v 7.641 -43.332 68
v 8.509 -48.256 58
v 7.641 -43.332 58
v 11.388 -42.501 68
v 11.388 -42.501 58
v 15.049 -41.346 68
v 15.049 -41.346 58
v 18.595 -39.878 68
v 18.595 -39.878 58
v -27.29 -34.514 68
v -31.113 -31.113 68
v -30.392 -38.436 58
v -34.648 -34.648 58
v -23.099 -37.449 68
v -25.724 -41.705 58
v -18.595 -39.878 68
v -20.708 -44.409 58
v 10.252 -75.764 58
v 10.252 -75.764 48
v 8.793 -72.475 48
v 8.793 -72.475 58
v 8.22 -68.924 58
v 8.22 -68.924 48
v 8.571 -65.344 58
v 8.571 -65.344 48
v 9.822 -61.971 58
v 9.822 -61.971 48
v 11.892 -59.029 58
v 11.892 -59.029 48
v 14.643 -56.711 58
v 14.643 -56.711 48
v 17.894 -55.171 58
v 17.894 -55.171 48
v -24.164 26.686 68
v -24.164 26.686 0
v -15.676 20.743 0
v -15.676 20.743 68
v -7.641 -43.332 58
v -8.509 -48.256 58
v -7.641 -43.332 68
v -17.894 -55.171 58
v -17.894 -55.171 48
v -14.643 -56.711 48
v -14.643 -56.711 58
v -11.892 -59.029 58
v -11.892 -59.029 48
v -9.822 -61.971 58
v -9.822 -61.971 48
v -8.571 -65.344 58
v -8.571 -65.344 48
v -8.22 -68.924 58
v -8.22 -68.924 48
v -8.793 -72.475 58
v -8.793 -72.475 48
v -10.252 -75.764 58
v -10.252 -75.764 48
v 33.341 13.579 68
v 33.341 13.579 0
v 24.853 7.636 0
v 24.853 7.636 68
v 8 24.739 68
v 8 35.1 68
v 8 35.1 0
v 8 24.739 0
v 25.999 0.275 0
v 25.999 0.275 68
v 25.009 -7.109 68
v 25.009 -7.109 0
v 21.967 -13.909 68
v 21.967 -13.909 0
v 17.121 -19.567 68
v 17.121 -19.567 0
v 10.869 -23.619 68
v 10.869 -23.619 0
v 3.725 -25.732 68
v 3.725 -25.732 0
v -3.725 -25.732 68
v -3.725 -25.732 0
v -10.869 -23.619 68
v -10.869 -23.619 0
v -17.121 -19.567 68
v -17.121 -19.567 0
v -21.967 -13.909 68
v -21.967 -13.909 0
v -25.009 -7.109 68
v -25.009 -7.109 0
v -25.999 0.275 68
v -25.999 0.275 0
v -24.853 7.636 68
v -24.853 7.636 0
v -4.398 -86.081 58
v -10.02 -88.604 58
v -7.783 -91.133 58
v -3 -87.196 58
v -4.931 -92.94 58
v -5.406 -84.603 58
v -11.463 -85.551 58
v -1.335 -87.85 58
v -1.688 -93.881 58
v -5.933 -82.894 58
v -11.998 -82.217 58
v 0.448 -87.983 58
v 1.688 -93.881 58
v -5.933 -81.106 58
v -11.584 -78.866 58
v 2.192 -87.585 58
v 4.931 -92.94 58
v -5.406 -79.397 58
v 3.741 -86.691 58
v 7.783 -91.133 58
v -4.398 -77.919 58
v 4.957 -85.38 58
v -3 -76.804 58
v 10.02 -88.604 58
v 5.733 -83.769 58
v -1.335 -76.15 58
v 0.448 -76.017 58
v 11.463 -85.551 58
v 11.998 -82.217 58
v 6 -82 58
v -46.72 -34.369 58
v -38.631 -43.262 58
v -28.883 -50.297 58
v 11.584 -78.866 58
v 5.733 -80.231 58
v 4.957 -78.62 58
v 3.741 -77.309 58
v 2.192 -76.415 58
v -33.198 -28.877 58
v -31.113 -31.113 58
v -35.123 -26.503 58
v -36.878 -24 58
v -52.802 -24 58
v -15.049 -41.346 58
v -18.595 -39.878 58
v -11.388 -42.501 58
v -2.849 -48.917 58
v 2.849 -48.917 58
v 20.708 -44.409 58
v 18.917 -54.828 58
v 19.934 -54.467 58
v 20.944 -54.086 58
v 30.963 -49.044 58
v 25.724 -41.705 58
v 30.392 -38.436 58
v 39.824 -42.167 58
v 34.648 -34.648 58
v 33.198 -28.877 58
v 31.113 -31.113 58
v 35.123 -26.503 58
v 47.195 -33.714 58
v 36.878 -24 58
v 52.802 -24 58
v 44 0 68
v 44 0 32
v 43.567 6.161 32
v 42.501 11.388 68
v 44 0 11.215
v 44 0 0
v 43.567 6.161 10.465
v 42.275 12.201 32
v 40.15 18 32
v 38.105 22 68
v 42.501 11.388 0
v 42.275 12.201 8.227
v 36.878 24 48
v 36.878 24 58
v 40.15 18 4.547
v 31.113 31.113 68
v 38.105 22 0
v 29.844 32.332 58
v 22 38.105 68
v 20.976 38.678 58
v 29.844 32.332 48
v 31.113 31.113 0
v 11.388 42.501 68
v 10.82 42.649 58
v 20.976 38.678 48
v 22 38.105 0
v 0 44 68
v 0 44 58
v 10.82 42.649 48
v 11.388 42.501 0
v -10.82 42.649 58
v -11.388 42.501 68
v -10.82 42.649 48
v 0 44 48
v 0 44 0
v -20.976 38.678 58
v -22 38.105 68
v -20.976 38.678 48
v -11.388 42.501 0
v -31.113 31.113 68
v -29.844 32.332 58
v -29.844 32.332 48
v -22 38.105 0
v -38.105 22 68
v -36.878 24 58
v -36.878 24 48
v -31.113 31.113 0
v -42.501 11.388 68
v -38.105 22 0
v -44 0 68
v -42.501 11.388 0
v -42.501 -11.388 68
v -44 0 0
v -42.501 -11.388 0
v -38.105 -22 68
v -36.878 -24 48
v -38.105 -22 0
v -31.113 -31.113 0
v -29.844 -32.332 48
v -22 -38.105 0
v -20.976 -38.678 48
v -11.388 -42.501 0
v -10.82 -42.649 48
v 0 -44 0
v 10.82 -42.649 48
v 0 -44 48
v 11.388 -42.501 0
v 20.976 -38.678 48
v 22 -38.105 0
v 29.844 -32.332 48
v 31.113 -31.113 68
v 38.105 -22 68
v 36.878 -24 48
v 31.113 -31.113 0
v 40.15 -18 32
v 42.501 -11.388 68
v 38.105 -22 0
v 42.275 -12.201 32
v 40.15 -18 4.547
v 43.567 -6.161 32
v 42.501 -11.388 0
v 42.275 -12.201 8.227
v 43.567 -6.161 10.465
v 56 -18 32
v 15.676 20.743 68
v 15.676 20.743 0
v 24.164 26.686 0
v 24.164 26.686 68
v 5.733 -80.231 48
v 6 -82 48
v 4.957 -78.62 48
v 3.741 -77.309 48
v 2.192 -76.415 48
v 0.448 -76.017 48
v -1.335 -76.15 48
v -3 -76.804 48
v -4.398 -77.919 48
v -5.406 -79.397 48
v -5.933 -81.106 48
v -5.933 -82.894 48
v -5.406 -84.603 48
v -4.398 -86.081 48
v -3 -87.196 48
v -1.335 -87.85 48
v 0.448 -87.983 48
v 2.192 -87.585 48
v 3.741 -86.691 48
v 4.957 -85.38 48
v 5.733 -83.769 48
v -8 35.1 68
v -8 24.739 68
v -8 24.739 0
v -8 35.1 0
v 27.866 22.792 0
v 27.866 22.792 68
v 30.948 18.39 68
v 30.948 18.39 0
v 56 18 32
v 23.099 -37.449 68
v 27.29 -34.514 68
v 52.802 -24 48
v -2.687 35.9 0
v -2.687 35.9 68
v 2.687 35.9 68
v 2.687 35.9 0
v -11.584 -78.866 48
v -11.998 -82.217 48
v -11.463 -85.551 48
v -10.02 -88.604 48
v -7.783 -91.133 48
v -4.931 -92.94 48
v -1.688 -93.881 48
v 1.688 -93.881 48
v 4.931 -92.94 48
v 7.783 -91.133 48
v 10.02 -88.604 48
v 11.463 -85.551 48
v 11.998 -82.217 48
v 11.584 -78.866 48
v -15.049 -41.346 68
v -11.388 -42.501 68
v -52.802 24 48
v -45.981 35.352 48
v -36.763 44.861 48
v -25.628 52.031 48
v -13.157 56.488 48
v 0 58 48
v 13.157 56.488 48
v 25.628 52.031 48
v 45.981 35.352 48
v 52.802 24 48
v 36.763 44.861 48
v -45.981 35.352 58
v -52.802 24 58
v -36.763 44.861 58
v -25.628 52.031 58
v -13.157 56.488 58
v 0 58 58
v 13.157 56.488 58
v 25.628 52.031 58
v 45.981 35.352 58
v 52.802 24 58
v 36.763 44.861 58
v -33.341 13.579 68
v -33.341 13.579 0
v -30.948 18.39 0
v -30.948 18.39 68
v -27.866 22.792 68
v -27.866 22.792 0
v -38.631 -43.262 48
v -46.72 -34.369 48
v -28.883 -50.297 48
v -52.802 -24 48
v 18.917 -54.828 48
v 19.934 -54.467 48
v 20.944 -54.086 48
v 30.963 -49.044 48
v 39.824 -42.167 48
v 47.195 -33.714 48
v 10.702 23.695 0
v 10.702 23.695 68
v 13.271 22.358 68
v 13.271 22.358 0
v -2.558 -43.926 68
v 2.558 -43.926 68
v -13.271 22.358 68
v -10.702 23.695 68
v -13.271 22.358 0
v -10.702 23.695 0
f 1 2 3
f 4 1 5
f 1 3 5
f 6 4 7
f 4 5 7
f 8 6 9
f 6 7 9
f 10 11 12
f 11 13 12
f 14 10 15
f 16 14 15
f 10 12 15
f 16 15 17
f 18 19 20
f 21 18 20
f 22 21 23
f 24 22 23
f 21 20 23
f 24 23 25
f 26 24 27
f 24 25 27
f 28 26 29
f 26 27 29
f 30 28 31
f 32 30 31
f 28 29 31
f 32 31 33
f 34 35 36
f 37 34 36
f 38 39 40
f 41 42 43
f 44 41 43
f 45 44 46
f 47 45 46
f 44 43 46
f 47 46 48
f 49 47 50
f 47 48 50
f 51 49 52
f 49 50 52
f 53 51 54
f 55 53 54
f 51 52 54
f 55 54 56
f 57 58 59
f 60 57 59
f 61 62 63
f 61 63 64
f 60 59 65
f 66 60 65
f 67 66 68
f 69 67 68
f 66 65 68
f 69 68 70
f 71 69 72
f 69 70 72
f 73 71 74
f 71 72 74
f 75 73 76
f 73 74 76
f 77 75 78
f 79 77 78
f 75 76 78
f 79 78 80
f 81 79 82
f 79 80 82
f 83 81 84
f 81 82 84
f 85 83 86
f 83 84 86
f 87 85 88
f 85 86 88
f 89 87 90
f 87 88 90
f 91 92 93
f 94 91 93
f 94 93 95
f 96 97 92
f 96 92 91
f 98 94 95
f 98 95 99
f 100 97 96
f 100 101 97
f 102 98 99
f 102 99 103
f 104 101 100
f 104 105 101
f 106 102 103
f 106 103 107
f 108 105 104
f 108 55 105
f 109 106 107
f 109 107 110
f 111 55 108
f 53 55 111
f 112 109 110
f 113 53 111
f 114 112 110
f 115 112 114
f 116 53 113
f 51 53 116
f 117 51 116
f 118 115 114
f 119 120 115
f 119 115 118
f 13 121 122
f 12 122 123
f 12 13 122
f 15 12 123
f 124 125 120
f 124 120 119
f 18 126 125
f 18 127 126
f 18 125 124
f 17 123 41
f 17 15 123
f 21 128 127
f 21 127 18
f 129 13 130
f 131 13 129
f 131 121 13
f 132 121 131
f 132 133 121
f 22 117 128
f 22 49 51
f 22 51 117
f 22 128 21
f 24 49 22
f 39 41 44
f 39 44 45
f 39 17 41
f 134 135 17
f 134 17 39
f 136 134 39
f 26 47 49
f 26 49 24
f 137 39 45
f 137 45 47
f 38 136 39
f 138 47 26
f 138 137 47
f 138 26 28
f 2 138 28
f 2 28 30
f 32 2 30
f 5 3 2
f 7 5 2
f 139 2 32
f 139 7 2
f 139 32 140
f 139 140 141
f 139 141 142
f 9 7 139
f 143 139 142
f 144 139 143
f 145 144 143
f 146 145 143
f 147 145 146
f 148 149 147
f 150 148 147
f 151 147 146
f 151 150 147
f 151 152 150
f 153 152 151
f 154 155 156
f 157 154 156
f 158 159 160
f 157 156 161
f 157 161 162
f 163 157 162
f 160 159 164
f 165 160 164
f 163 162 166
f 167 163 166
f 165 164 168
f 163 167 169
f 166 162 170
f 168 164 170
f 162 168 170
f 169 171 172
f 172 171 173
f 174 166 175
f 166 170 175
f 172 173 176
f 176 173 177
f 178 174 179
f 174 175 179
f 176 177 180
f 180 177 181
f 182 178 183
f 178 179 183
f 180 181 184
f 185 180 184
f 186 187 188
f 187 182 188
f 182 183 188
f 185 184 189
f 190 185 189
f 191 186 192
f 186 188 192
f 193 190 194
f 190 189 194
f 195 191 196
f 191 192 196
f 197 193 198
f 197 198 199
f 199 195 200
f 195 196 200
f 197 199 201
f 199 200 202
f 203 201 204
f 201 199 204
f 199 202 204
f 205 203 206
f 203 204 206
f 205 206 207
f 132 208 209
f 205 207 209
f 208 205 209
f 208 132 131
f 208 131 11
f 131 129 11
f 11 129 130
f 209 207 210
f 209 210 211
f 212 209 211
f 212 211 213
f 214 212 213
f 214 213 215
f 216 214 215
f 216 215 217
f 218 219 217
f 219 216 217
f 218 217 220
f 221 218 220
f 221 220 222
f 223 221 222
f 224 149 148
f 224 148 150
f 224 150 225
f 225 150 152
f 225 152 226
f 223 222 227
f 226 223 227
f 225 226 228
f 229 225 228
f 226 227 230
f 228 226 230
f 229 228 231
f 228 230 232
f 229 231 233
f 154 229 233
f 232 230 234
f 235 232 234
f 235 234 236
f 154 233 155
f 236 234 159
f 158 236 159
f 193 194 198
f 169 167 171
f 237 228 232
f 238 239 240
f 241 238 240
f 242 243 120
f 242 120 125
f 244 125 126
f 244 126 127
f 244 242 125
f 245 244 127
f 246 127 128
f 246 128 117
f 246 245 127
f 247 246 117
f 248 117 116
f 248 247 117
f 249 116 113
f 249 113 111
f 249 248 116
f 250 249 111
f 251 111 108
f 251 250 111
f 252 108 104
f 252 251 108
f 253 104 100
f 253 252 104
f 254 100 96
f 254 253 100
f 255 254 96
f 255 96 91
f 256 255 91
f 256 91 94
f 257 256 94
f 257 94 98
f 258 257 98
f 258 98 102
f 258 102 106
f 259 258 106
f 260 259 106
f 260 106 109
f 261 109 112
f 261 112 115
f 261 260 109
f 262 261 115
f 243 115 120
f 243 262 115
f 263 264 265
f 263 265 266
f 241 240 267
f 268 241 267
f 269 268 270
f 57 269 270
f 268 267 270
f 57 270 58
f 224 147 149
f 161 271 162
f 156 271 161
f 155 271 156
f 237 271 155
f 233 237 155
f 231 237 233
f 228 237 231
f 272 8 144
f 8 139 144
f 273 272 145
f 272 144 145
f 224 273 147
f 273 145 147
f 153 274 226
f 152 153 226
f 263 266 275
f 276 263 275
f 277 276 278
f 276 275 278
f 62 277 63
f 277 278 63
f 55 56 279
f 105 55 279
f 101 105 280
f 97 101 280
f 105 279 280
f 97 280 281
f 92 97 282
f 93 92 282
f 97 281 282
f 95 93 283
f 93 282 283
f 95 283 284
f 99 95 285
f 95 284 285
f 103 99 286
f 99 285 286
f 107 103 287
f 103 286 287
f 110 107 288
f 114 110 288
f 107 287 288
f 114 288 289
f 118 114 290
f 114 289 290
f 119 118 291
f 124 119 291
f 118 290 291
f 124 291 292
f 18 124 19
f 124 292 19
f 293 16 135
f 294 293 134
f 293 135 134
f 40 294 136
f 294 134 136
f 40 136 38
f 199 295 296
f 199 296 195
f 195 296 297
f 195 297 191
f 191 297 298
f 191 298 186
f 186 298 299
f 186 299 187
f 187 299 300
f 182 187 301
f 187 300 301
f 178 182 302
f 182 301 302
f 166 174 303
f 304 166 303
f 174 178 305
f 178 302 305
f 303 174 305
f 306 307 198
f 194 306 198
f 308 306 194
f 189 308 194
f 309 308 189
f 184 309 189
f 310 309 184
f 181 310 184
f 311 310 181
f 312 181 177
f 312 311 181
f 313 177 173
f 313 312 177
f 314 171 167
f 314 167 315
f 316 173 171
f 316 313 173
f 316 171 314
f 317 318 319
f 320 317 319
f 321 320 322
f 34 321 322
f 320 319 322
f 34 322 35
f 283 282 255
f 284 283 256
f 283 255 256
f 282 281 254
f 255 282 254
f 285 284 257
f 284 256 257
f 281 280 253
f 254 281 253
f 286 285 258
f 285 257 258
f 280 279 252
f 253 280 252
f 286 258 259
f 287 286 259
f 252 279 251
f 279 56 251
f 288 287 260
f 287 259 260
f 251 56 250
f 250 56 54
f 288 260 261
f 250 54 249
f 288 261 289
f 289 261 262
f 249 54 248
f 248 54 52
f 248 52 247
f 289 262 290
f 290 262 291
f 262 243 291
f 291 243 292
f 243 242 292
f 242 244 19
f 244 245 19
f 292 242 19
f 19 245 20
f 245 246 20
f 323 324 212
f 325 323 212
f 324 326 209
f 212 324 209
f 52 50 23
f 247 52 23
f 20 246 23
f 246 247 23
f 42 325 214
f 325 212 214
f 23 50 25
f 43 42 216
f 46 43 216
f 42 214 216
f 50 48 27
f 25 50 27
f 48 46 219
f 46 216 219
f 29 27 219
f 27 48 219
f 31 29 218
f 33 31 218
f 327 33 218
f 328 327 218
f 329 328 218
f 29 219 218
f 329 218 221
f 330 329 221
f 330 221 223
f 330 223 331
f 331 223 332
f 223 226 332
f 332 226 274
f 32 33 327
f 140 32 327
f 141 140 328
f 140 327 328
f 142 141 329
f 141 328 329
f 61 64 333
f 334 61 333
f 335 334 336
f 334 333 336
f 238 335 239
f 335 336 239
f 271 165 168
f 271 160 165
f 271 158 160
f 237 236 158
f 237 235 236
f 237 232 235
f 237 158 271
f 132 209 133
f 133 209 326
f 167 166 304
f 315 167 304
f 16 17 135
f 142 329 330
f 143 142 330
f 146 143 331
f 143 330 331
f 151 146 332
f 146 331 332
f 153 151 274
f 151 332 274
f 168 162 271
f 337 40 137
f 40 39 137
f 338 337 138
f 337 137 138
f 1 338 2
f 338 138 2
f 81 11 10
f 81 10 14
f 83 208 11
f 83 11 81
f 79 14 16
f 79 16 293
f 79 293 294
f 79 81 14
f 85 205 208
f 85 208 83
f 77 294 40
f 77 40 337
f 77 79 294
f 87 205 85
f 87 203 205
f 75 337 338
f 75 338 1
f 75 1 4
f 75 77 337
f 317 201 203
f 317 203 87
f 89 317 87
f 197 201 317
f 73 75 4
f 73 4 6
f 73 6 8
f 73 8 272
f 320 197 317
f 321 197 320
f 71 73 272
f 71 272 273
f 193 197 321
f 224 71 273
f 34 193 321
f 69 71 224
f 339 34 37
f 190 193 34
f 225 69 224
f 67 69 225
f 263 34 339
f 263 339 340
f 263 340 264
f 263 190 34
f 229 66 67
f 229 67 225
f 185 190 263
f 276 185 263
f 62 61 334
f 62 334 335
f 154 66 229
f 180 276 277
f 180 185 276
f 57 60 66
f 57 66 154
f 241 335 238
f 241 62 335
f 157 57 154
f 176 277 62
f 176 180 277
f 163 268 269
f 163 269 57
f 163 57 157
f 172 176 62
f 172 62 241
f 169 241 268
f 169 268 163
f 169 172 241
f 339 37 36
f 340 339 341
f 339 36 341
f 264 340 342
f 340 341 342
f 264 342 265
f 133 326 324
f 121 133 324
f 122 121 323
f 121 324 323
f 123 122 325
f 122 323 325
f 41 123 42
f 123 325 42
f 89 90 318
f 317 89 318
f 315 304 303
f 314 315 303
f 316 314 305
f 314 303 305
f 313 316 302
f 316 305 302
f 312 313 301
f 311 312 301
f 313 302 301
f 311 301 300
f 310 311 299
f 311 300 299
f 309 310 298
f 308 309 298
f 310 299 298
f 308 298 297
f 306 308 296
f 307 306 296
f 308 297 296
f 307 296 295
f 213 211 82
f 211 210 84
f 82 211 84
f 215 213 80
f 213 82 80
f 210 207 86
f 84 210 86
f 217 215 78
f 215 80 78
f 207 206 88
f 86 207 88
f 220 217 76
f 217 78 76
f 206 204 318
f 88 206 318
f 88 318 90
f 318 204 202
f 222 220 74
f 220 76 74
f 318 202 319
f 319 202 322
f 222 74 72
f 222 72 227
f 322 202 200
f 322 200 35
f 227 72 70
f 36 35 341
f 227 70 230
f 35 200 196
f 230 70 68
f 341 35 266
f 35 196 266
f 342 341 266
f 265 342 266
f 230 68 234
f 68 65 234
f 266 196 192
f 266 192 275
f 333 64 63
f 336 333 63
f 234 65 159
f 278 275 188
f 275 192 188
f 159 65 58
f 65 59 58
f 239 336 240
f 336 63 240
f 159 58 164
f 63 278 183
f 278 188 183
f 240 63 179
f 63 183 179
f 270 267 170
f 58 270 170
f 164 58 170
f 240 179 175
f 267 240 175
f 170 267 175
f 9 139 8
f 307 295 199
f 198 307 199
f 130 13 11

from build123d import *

# Parameters (mm, degrees)
F0_R           = 44
F1_DEPTH       = 68
F3_R           = 6
F4_DEPTH       = 10
F6_DEPTH       = 18
F8_ANGLE_BACK  = 10
F8_ANGLE       = 20
F12_ANGLE_BACK = 10
F12_ANGLE      = 20
F14_ANGLE_BACK = 10
F14_ANGLE      = 20


with BuildPart() as f1:
    # F0 (on Top) → F1 (new body)
    with BuildSketch(Plane.XY):
        Circle(F0_R)
        with BuildLine():
            ThreePointArc((-33.3407315568, 13.5792348554), (-29.4894735944, 20.6487517086), (-24.1635085752, 26.685667564))
            Line((-24.1635085752, 26.685667564), (-15.6760909215, 20.742713743))
            ThreePointArc((-15.6760909215, 20.742713743), (-12.0054639441, 23.0622816626), (-8, 24.7386337537))
            Line((-8, 24.7386337537), (-8, 35.0998575496))
            ThreePointArc((-8, 35.0998575496), (0, 36), (8, 35.0998575496))
            Line((8, 35.0998575496), (8, 24.7386337537))
            ThreePointArc((8, 24.7386337537), (12.0054639441, 23.0622816626), (15.6760909215, 20.742713743))
            Line((15.6760909215, 20.742713743), (24.1635085752, 26.685667564))
            ThreePointArc((24.1635085752, 26.685667564), (29.4894735944, 20.6487517086), (33.3407315568, 13.5792348554))
            Line((33.3407315568, 13.5792348554), (24.8533139031, 7.6362810343))
            ThreePointArc((24.8533139031, 7.6362810343), (0, -26), (-24.8533139031, 7.6362810343))
            Line((-24.8533139031, 7.6362810343), (-33.3407315568, 13.5792348554))
        make_face(mode=Mode.SUBTRACT)
    extrude(amount=F1_DEPTH)

    # F3 (on offset) → F4 (join)
    with BuildSketch(Plane.XY.offset(48)):
        with BuildLine():
            Line((-36.8781778292, -24), (-52.8015151298, -24))
            ThreePointArc((-52.8015151298, -24), (-38.6311115614, -43.2624227191), (-17.8938638331, -55.1707317073))
            ThreePointArc((-17.8938638331, -55.1707317073), (-9.0876412514, -63.6171726174), (-10.252187236, -75.7636022514))
            ThreePointArc((-10.252187236, -75.7636022514), (0, -94), (10.252187236, -75.7636022514))
            ThreePointArc((10.252187236, -75.7636022514), (9.0876412514, -63.6171726174), (17.8938638331, -55.1707317073))
            ThreePointArc((17.8938638331, -55.1707317073), (19.4267221495, -54.6498167108), (20.9444444444, -54.0863221796))
            ThreePointArc((20.9444444444, -54.0863221796), (39.8235273922, -42.1673649407), (52.8015151298, -24))
            Line((52.8015151298, -24), (36.8781778292, -24))
            ThreePointArc((36.8781778292, -24), (0, -44), (-36.8781778292, -24))
        make_face()
        with Locations((0, -82)):
            Circle(F3_R, mode=Mode.SUBTRACT)
        with BuildLine():
            Line((-52.8015151298, 24), (-36.8781778292, 24))
            ThreePointArc((-36.8781778292, 24), (0, 44), (36.8781778292, 24))
            Line((36.8781778292, 24), (52.8015151298, 24))
            ThreePointArc((52.8015151298, 24), (0, 58), (-52.8015151298, 24))
        make_face()
    extrude(amount=F4_DEPTH)

    # F5 (on Front) → F6 (join, symmetric)
    with BuildSketch(Plane.XZ):
        Polygon((56, 32), (39, 32), (39, 2.5551362713), align=None)
    extrude(amount=F6_DEPTH, both=True)

    # F7 (on Right) → F8 (revolve)
    with BuildSketch(Plane.YZ, mode=Mode.PRIVATE) as f8_sk:
        Polygon((-44, 58), (-44, 68), (-49, 58), align=None)
    revolve(f8_sk.sketch.rotate(Axis((0, 0, 36.8064753711), (0, 0, 1)), -F8_ANGLE_BACK), axis=Axis((0, 0, 36.8064753711), (0, 0, 1)), revolution_arc=F8_ANGLE)

    # F11 (on line) → F12 (revolve)
    with BuildSketch(Plane(origin=(0, 0, 0), x_dir=(-0.5735764364, 0.8191520443, 0), z_dir=(0.8191520443, 0.5735764364, 0)), mode=Mode.PRIVATE) as f12_sk:
        Polygon((-44, 58), (-44, 68), (-49, 58), align=None)
    revolve(f12_sk.sketch.rotate(Axis((0, 0, 36.8064753711), (0, 0, 1)), -F12_ANGLE_BACK), axis=Axis((0, 0, 36.8064753711), (0, 0, 1)), revolution_arc=F12_ANGLE)

    # F13 (on line) → F14 (revolve)
    with BuildSketch(Plane(origin=(0, 0, 0), x_dir=(0.5735764364, 0.8191520443, 0), z_dir=(0.8191520443, -0.5735764364, 0)), mode=Mode.PRIVATE) as f14_sk:
        Polygon((-49, 58), (-44, 58), (-44, 68), align=None)
    revolve(f14_sk.sketch.rotate(Axis((0, 0, 36.8064753711), (0, 0, 1)), -F14_ANGLE_BACK), axis=Axis((0, 0, 36.8064753711), (0, 0, 1)), revolution_arc=F14_ANGLE)


solid = f1.part
